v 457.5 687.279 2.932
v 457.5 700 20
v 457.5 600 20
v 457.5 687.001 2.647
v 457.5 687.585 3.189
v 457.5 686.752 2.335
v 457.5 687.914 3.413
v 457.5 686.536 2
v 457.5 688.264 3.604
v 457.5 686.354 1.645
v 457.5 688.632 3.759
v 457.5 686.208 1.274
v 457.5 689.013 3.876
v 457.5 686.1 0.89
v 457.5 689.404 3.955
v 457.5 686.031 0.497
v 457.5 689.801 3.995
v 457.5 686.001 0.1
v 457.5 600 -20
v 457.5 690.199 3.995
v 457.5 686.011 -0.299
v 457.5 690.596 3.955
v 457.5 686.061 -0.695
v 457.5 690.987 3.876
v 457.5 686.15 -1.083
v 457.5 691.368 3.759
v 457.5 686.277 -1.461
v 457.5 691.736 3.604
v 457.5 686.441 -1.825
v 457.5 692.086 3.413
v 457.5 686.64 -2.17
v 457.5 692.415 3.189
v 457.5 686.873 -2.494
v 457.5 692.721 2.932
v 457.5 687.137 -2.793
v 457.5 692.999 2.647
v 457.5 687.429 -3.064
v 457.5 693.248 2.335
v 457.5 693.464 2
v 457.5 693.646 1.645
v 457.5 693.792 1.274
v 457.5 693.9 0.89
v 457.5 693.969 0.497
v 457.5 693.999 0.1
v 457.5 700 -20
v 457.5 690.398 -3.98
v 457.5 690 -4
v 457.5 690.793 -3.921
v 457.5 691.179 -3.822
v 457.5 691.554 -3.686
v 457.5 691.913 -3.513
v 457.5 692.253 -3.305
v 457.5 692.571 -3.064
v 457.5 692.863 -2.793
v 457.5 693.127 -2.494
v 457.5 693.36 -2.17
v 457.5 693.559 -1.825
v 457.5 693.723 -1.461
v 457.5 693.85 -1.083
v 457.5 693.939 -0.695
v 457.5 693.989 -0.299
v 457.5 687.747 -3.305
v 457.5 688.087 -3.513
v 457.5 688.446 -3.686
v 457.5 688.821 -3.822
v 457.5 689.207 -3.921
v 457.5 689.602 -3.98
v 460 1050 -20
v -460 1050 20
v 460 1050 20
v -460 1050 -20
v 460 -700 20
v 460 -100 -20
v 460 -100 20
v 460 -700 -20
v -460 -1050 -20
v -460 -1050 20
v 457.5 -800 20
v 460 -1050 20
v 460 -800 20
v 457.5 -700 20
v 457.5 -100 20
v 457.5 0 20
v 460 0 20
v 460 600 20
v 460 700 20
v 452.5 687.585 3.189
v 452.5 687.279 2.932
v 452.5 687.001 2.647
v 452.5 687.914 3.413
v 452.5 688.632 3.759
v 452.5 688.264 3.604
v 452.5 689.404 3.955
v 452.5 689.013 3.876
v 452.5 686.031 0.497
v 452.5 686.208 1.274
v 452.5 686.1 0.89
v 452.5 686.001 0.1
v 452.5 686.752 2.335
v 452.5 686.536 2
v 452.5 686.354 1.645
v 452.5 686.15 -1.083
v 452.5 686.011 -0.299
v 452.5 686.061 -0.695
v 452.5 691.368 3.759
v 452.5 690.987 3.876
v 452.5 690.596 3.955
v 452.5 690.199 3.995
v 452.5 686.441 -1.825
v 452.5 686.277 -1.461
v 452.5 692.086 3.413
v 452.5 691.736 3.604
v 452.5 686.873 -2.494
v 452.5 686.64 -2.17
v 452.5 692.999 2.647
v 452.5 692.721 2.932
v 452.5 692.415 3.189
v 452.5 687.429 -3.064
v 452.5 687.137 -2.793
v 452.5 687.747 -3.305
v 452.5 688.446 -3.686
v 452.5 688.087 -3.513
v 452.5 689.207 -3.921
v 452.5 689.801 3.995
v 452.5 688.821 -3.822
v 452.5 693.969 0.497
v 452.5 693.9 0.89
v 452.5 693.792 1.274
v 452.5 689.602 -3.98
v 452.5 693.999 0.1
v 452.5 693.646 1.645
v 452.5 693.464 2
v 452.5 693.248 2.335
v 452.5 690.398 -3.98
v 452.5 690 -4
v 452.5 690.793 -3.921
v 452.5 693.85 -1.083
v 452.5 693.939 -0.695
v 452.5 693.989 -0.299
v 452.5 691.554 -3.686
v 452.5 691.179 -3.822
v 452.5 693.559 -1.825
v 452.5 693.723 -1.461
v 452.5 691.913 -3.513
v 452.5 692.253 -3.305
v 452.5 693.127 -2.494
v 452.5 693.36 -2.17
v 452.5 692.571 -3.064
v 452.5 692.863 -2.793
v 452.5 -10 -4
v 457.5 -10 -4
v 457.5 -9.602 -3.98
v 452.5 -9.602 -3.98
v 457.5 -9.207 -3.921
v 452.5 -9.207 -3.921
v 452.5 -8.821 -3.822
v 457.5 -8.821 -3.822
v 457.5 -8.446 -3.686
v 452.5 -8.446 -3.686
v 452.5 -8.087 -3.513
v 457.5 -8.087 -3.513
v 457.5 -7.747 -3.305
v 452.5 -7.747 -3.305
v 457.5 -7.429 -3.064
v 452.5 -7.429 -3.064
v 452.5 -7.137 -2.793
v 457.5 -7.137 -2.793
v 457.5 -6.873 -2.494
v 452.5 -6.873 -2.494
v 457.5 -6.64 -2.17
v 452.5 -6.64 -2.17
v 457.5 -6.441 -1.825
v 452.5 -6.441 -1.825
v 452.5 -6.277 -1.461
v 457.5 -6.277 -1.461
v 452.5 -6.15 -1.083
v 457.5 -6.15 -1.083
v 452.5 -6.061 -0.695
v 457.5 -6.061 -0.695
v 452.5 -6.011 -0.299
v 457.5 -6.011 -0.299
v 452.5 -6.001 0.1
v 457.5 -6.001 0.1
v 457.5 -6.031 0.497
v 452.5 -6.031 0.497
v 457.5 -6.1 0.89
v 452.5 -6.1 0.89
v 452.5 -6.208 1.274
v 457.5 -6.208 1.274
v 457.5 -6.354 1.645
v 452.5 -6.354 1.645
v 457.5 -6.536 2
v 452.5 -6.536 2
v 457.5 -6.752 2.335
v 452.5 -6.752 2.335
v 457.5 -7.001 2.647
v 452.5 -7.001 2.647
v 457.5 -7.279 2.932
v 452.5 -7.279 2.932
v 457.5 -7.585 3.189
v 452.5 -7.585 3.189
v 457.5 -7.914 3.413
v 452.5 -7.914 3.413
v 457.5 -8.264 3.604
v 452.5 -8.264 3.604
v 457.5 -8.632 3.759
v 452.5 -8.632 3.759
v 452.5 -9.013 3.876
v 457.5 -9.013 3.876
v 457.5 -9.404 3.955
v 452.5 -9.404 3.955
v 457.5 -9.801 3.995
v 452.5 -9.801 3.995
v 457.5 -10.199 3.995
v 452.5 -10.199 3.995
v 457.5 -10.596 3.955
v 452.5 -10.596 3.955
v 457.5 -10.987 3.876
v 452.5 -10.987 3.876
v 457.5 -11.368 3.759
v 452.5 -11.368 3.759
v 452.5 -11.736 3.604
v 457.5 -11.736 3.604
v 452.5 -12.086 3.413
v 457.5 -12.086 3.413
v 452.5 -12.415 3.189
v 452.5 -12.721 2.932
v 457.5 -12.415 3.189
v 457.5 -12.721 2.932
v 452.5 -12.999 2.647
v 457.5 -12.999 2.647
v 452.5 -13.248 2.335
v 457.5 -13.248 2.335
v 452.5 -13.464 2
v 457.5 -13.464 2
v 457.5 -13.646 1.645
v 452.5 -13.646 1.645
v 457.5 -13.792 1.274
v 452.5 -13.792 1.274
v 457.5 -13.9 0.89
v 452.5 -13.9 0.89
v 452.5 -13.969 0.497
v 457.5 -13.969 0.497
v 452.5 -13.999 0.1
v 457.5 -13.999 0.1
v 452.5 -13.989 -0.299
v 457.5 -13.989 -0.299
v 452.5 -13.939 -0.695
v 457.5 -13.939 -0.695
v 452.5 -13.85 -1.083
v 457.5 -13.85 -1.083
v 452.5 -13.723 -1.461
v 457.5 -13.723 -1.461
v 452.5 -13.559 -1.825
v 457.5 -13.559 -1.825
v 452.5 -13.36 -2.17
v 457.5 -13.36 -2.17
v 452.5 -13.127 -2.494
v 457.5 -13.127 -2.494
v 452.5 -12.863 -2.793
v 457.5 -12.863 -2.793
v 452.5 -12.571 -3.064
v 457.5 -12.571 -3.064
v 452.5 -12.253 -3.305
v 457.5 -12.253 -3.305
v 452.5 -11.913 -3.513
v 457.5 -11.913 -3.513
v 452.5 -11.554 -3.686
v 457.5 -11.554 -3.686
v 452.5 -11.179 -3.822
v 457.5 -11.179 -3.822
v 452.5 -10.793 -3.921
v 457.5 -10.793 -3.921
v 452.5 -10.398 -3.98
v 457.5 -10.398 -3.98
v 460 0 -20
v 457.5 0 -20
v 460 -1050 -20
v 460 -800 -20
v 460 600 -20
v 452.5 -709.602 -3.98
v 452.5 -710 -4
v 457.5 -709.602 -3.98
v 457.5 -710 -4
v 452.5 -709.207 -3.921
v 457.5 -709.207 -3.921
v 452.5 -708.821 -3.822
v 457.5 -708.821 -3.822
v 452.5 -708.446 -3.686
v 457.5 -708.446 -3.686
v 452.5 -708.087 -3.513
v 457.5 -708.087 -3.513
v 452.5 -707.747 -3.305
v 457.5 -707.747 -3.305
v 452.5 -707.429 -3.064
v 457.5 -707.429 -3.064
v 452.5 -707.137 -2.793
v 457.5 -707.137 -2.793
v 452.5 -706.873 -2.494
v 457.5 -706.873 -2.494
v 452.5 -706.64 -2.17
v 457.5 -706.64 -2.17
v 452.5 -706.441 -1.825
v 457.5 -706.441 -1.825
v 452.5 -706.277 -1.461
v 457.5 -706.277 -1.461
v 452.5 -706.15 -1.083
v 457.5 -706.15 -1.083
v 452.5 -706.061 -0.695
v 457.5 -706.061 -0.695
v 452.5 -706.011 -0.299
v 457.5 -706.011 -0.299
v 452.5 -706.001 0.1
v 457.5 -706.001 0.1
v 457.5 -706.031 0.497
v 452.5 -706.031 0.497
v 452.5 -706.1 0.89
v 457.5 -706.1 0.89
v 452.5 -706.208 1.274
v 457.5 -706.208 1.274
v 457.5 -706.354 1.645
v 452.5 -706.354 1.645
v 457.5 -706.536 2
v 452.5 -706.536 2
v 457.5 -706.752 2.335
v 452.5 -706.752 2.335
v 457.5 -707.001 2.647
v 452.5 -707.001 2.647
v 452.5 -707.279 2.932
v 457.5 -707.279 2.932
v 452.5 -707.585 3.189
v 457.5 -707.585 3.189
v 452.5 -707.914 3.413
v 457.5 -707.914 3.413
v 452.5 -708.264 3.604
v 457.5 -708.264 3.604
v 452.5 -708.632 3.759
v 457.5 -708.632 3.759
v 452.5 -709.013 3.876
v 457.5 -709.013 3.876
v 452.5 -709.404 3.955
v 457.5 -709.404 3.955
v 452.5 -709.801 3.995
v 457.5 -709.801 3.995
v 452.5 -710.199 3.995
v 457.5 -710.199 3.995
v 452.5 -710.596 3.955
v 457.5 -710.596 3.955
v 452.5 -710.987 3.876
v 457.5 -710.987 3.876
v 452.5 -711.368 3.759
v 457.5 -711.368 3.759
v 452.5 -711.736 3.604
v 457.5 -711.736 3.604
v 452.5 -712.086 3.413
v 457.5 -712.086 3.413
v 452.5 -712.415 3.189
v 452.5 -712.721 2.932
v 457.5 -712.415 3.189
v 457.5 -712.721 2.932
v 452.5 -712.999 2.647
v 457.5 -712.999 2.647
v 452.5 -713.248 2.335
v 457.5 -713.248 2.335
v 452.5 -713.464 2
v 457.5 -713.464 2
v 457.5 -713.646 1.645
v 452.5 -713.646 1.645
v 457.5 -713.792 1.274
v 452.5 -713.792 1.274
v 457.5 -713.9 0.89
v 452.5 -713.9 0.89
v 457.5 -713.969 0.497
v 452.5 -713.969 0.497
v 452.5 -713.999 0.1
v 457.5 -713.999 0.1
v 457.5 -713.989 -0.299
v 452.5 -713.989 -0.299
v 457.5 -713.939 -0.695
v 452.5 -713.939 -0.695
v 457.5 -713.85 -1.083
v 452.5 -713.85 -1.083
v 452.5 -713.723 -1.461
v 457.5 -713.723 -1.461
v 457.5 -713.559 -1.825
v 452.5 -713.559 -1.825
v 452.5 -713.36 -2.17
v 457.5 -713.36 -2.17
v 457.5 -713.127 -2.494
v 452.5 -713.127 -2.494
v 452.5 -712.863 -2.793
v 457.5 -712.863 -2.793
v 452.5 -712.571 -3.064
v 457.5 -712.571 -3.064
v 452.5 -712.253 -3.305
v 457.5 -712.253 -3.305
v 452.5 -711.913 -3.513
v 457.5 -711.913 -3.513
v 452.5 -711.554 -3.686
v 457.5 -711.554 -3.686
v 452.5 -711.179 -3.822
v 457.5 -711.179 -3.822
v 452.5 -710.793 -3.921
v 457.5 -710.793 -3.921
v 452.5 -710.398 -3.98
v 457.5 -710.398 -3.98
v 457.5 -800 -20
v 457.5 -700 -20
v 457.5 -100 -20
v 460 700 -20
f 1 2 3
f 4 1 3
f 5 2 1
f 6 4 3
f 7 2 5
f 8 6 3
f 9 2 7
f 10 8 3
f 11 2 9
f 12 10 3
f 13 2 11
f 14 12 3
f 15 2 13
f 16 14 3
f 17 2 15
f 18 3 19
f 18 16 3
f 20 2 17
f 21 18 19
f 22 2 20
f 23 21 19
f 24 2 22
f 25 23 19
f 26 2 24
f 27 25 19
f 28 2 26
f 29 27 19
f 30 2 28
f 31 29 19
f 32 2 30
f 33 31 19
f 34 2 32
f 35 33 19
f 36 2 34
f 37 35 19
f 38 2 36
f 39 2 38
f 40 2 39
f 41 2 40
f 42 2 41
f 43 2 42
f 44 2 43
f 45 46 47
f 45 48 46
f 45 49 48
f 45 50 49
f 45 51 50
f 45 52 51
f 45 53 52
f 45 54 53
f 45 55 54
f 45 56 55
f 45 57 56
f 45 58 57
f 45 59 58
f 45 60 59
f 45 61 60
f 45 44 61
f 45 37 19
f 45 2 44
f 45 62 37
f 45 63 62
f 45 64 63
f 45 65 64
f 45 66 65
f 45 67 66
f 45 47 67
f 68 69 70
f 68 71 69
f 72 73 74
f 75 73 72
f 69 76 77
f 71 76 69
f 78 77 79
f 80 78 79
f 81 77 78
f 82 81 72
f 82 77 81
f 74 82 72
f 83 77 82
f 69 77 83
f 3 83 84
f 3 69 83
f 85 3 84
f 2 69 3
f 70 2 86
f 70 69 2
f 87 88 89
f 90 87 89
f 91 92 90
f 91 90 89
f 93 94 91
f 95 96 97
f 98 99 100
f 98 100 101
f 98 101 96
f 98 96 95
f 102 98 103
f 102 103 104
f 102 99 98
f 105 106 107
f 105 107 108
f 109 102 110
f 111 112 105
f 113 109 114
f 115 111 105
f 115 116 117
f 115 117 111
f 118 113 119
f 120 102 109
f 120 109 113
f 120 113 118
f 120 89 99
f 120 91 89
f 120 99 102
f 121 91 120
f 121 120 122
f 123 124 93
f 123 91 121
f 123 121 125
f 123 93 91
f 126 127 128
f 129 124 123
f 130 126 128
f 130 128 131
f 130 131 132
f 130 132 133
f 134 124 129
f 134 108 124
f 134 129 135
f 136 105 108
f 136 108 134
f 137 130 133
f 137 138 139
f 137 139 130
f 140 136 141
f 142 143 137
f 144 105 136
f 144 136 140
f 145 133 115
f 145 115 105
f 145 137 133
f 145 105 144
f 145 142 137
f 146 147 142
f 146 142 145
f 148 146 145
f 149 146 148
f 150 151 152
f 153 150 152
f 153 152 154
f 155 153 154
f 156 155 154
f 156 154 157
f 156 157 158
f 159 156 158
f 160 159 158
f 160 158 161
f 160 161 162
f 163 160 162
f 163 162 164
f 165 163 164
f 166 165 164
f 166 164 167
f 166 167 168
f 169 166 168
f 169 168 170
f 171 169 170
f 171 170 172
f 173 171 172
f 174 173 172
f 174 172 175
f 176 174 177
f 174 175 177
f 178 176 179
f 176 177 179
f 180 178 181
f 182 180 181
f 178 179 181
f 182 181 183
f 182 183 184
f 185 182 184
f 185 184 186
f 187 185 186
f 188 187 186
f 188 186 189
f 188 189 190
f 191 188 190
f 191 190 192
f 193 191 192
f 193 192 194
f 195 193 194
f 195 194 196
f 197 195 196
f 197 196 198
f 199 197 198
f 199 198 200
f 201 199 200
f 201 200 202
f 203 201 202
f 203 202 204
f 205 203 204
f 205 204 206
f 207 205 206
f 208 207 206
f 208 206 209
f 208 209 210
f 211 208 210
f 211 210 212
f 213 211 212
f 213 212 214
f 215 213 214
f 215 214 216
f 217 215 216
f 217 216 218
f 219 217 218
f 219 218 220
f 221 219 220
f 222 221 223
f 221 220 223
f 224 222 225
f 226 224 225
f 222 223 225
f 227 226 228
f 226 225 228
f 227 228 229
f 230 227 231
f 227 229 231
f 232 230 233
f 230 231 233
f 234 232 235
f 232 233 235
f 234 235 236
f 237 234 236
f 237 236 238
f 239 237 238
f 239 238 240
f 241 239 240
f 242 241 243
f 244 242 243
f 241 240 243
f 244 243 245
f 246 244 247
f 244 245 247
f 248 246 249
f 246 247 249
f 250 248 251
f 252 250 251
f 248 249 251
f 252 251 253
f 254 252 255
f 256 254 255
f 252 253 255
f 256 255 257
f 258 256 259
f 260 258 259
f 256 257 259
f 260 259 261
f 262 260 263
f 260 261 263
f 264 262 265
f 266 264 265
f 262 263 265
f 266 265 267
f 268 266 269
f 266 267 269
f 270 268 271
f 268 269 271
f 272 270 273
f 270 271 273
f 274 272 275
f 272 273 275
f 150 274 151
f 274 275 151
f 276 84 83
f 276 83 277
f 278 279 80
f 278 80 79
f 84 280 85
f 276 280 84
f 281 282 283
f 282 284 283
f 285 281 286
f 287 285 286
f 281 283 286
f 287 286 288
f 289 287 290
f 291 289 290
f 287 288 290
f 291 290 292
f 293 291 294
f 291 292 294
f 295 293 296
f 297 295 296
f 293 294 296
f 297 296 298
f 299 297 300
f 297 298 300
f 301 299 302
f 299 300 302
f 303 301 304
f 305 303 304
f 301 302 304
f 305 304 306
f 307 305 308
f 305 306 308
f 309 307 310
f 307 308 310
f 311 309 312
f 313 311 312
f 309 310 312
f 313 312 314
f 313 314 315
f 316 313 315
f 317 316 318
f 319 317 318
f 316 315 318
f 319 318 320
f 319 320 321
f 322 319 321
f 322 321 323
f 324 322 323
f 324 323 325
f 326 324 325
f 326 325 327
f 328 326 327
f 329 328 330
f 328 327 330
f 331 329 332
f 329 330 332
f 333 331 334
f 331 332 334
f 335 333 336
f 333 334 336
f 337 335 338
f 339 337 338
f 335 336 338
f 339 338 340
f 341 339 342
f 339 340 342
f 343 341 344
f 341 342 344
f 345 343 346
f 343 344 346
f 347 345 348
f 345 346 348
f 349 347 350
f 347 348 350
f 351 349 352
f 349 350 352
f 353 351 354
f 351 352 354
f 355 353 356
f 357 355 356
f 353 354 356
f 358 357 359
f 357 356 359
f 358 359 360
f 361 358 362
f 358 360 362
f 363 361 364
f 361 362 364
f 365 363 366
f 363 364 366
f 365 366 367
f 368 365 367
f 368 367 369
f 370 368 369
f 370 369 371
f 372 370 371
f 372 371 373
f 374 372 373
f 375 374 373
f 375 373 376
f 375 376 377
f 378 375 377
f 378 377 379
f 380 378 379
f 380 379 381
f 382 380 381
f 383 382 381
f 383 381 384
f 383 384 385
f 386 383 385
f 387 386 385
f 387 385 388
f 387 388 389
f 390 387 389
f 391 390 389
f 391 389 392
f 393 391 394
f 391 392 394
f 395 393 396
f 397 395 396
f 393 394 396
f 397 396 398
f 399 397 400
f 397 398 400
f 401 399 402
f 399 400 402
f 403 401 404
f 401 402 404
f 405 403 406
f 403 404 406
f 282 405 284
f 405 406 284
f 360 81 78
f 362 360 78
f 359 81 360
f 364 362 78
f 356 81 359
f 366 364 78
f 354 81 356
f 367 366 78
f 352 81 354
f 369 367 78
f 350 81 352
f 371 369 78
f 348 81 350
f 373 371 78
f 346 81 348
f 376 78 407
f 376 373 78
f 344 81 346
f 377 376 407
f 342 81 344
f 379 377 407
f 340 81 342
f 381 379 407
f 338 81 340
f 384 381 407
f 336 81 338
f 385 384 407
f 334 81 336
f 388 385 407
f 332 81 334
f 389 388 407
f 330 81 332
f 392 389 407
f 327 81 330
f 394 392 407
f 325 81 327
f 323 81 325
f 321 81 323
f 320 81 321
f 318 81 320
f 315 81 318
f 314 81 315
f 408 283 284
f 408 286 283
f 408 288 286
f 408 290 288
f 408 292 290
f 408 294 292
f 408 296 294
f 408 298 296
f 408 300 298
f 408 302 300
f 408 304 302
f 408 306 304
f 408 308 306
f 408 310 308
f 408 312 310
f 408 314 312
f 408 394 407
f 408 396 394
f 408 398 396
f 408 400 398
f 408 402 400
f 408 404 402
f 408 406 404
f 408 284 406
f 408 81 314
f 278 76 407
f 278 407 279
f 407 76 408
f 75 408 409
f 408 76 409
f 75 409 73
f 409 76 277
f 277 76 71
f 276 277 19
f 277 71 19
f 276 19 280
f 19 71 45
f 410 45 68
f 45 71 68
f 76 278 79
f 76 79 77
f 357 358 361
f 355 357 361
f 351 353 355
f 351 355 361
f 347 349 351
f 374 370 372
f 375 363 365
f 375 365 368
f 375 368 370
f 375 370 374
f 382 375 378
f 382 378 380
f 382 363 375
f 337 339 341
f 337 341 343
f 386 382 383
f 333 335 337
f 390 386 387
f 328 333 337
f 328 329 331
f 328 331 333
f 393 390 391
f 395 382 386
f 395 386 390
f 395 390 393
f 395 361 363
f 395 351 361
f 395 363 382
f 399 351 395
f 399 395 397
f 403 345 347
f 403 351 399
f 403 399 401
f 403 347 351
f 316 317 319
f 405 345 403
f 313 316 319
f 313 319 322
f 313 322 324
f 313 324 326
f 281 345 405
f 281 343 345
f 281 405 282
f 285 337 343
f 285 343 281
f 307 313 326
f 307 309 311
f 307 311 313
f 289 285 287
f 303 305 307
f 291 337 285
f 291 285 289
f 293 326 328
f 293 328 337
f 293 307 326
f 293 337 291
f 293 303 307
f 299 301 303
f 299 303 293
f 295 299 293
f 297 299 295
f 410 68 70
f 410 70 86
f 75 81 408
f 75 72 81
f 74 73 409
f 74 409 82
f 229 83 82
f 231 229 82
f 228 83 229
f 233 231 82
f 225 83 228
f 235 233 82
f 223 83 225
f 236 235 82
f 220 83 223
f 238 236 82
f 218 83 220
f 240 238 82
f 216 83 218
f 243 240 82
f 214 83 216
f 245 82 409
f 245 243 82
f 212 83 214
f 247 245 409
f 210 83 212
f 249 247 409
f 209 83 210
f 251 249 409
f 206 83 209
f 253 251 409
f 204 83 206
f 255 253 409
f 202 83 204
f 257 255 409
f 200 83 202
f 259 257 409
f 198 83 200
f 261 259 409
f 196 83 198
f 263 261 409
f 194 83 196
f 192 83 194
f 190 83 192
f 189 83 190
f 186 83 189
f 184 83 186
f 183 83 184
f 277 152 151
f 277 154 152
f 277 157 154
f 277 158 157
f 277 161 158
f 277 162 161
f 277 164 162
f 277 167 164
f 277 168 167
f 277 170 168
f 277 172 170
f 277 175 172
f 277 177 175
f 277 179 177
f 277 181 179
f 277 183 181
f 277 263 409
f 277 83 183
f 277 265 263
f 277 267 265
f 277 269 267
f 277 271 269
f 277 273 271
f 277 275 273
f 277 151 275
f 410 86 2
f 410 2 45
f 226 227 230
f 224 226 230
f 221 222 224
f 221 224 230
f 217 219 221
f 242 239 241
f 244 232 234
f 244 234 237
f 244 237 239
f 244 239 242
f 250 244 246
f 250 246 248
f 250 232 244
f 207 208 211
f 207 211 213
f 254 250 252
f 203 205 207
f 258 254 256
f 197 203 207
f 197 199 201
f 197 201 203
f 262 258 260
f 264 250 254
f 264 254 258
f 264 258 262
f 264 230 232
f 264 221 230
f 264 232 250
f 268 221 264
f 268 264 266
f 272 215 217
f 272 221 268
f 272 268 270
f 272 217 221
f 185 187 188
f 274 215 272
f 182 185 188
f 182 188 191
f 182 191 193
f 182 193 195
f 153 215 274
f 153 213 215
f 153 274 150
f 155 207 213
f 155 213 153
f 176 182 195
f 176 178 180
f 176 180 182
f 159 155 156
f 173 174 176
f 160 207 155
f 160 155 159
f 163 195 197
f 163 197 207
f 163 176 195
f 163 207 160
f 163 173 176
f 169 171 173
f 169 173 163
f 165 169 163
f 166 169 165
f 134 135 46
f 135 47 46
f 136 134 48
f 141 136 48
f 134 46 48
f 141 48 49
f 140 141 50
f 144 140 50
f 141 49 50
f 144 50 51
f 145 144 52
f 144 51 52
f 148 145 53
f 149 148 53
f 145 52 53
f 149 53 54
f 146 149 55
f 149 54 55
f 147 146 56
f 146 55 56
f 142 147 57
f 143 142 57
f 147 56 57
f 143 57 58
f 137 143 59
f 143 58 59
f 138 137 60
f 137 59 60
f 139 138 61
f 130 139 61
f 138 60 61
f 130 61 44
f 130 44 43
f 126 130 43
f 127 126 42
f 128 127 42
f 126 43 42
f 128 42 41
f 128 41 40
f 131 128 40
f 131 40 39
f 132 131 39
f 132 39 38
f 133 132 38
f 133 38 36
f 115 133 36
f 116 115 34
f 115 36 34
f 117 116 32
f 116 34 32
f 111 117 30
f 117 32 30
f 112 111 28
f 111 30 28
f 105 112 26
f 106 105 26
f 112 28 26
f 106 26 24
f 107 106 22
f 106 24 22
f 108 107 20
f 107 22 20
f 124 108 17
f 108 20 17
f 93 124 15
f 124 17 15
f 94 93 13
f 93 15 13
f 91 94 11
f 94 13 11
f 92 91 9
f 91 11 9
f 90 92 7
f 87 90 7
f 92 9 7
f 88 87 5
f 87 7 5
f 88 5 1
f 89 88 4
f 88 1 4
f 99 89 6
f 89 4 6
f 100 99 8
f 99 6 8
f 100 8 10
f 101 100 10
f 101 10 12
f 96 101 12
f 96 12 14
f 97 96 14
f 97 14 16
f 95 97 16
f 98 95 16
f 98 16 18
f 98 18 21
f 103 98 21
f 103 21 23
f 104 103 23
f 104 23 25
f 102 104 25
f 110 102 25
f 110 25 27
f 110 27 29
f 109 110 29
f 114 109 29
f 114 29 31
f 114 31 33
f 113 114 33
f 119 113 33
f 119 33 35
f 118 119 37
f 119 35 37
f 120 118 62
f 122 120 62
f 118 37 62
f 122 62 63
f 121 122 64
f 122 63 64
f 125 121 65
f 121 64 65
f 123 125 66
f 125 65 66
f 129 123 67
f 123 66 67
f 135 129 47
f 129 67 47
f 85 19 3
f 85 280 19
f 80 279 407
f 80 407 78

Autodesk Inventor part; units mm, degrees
ref_plane "YZ Plane" through (0, 0, 0) normal (1, 0, 0) x (0, 1, 0)
ref_plane "XZ Plane" through (0, 0, 0) normal (0, 1, 0) x (-1, 0, 0)
ref_plane "XY Plane" through (0, 0, 0) normal (0, 0, 1) x (1, 0, 0)
sketch "Sketch1" plane through (0, 0, 0) normal (0, 0, 1) x (1, 0, 0)
  line L0 (460, -1050) -> (-460, -1050)
  line L1 (-460, -1050) -> (-460, 1050)
  line L2 (-460, 1050) -> (460, 1050)
  line L3 (460, 1050) -> (460, -1050)
  line L4 (460, -1050) -> (-460, 1050) construction
  line L5 (-460, -1050) -> (460, 1050) construction
  point P0 (0, 0)
  dimension "d0" = 2100
  dimension "d1" = 920
extrude "Extrusion1" add sketch "Sketch1" along normal mid plane 40
sketch "Sketch2" plane through (460, -1050, 20) normal (1, 0, 0) x (0, 0, -1)
  line L0 (40, 1650) -> (0, 1650)
  line L1 (0, 1650) -> (0, 1750)
  line L2 (0, 1750) -> (40, 1750)
  line L3 (40, 1750) -> (40, 1650)
  line L4 (40, 1650) -> (0, 1750) construction
  line L5 (0, 1650) -> (40, 1750) construction
  line L6 (40, 2100) -> (40, 0) projected
  line L7 (0, 2100) -> (40, 2100) projected
  line L8 (40, 950) -> (0, 950)
  line L9 (0, 950) -> (0, 1050)
  line L10 (40, 1050) -> (40, 950)
  line L11 (0, 1050) -> (40, 1050)
  line L12 (40, 250) -> (0, 250)
  line L13 (0, 250) -> (0, 350)
  line L14 (40, 350) -> (40, 250)
  line L15 (0, 350) -> (40, 350)
  point P0 (20, 1050)
  point P1 (20, 1700)
  point P2 (40, 250)
  point P3 (40, 350)
  point P4 (40, 950)
  point P5 (40, 1050)
  dimension "d4" = 100
  dimension "d5" = 40
  dimension "d9" = 700
  dimension "d21" = 350
extrude "Extrusion2" cut sketch "Sketch2" against normal blind 2.5
sketch "Sketch3" plane through (457.5, -1050, 20) normal (1, 0, 0) x (0, 0, -1)
  circle A0 centre (20, 1040) radius 4
  line L0 (0, 1050) -> (40, 1050) projected
  line L1 (40, 1050) -> (40, 950) projected
  point P0 (20, 1050)
  dimension "d16" = 8
  dimension "d17" = 10
  dimension "d18" = 20
extrude "Extrusion3" cut sketch "Sketch3" against normal blind 5
pattern_linear "Rectangular Pattern1" count 2 spacing 700 along (0, 1, 0) count 2 spacing 700 along (0, -1, 0) of "Extrusion3"
properties part number "Door" material "Wood (Oak)"
